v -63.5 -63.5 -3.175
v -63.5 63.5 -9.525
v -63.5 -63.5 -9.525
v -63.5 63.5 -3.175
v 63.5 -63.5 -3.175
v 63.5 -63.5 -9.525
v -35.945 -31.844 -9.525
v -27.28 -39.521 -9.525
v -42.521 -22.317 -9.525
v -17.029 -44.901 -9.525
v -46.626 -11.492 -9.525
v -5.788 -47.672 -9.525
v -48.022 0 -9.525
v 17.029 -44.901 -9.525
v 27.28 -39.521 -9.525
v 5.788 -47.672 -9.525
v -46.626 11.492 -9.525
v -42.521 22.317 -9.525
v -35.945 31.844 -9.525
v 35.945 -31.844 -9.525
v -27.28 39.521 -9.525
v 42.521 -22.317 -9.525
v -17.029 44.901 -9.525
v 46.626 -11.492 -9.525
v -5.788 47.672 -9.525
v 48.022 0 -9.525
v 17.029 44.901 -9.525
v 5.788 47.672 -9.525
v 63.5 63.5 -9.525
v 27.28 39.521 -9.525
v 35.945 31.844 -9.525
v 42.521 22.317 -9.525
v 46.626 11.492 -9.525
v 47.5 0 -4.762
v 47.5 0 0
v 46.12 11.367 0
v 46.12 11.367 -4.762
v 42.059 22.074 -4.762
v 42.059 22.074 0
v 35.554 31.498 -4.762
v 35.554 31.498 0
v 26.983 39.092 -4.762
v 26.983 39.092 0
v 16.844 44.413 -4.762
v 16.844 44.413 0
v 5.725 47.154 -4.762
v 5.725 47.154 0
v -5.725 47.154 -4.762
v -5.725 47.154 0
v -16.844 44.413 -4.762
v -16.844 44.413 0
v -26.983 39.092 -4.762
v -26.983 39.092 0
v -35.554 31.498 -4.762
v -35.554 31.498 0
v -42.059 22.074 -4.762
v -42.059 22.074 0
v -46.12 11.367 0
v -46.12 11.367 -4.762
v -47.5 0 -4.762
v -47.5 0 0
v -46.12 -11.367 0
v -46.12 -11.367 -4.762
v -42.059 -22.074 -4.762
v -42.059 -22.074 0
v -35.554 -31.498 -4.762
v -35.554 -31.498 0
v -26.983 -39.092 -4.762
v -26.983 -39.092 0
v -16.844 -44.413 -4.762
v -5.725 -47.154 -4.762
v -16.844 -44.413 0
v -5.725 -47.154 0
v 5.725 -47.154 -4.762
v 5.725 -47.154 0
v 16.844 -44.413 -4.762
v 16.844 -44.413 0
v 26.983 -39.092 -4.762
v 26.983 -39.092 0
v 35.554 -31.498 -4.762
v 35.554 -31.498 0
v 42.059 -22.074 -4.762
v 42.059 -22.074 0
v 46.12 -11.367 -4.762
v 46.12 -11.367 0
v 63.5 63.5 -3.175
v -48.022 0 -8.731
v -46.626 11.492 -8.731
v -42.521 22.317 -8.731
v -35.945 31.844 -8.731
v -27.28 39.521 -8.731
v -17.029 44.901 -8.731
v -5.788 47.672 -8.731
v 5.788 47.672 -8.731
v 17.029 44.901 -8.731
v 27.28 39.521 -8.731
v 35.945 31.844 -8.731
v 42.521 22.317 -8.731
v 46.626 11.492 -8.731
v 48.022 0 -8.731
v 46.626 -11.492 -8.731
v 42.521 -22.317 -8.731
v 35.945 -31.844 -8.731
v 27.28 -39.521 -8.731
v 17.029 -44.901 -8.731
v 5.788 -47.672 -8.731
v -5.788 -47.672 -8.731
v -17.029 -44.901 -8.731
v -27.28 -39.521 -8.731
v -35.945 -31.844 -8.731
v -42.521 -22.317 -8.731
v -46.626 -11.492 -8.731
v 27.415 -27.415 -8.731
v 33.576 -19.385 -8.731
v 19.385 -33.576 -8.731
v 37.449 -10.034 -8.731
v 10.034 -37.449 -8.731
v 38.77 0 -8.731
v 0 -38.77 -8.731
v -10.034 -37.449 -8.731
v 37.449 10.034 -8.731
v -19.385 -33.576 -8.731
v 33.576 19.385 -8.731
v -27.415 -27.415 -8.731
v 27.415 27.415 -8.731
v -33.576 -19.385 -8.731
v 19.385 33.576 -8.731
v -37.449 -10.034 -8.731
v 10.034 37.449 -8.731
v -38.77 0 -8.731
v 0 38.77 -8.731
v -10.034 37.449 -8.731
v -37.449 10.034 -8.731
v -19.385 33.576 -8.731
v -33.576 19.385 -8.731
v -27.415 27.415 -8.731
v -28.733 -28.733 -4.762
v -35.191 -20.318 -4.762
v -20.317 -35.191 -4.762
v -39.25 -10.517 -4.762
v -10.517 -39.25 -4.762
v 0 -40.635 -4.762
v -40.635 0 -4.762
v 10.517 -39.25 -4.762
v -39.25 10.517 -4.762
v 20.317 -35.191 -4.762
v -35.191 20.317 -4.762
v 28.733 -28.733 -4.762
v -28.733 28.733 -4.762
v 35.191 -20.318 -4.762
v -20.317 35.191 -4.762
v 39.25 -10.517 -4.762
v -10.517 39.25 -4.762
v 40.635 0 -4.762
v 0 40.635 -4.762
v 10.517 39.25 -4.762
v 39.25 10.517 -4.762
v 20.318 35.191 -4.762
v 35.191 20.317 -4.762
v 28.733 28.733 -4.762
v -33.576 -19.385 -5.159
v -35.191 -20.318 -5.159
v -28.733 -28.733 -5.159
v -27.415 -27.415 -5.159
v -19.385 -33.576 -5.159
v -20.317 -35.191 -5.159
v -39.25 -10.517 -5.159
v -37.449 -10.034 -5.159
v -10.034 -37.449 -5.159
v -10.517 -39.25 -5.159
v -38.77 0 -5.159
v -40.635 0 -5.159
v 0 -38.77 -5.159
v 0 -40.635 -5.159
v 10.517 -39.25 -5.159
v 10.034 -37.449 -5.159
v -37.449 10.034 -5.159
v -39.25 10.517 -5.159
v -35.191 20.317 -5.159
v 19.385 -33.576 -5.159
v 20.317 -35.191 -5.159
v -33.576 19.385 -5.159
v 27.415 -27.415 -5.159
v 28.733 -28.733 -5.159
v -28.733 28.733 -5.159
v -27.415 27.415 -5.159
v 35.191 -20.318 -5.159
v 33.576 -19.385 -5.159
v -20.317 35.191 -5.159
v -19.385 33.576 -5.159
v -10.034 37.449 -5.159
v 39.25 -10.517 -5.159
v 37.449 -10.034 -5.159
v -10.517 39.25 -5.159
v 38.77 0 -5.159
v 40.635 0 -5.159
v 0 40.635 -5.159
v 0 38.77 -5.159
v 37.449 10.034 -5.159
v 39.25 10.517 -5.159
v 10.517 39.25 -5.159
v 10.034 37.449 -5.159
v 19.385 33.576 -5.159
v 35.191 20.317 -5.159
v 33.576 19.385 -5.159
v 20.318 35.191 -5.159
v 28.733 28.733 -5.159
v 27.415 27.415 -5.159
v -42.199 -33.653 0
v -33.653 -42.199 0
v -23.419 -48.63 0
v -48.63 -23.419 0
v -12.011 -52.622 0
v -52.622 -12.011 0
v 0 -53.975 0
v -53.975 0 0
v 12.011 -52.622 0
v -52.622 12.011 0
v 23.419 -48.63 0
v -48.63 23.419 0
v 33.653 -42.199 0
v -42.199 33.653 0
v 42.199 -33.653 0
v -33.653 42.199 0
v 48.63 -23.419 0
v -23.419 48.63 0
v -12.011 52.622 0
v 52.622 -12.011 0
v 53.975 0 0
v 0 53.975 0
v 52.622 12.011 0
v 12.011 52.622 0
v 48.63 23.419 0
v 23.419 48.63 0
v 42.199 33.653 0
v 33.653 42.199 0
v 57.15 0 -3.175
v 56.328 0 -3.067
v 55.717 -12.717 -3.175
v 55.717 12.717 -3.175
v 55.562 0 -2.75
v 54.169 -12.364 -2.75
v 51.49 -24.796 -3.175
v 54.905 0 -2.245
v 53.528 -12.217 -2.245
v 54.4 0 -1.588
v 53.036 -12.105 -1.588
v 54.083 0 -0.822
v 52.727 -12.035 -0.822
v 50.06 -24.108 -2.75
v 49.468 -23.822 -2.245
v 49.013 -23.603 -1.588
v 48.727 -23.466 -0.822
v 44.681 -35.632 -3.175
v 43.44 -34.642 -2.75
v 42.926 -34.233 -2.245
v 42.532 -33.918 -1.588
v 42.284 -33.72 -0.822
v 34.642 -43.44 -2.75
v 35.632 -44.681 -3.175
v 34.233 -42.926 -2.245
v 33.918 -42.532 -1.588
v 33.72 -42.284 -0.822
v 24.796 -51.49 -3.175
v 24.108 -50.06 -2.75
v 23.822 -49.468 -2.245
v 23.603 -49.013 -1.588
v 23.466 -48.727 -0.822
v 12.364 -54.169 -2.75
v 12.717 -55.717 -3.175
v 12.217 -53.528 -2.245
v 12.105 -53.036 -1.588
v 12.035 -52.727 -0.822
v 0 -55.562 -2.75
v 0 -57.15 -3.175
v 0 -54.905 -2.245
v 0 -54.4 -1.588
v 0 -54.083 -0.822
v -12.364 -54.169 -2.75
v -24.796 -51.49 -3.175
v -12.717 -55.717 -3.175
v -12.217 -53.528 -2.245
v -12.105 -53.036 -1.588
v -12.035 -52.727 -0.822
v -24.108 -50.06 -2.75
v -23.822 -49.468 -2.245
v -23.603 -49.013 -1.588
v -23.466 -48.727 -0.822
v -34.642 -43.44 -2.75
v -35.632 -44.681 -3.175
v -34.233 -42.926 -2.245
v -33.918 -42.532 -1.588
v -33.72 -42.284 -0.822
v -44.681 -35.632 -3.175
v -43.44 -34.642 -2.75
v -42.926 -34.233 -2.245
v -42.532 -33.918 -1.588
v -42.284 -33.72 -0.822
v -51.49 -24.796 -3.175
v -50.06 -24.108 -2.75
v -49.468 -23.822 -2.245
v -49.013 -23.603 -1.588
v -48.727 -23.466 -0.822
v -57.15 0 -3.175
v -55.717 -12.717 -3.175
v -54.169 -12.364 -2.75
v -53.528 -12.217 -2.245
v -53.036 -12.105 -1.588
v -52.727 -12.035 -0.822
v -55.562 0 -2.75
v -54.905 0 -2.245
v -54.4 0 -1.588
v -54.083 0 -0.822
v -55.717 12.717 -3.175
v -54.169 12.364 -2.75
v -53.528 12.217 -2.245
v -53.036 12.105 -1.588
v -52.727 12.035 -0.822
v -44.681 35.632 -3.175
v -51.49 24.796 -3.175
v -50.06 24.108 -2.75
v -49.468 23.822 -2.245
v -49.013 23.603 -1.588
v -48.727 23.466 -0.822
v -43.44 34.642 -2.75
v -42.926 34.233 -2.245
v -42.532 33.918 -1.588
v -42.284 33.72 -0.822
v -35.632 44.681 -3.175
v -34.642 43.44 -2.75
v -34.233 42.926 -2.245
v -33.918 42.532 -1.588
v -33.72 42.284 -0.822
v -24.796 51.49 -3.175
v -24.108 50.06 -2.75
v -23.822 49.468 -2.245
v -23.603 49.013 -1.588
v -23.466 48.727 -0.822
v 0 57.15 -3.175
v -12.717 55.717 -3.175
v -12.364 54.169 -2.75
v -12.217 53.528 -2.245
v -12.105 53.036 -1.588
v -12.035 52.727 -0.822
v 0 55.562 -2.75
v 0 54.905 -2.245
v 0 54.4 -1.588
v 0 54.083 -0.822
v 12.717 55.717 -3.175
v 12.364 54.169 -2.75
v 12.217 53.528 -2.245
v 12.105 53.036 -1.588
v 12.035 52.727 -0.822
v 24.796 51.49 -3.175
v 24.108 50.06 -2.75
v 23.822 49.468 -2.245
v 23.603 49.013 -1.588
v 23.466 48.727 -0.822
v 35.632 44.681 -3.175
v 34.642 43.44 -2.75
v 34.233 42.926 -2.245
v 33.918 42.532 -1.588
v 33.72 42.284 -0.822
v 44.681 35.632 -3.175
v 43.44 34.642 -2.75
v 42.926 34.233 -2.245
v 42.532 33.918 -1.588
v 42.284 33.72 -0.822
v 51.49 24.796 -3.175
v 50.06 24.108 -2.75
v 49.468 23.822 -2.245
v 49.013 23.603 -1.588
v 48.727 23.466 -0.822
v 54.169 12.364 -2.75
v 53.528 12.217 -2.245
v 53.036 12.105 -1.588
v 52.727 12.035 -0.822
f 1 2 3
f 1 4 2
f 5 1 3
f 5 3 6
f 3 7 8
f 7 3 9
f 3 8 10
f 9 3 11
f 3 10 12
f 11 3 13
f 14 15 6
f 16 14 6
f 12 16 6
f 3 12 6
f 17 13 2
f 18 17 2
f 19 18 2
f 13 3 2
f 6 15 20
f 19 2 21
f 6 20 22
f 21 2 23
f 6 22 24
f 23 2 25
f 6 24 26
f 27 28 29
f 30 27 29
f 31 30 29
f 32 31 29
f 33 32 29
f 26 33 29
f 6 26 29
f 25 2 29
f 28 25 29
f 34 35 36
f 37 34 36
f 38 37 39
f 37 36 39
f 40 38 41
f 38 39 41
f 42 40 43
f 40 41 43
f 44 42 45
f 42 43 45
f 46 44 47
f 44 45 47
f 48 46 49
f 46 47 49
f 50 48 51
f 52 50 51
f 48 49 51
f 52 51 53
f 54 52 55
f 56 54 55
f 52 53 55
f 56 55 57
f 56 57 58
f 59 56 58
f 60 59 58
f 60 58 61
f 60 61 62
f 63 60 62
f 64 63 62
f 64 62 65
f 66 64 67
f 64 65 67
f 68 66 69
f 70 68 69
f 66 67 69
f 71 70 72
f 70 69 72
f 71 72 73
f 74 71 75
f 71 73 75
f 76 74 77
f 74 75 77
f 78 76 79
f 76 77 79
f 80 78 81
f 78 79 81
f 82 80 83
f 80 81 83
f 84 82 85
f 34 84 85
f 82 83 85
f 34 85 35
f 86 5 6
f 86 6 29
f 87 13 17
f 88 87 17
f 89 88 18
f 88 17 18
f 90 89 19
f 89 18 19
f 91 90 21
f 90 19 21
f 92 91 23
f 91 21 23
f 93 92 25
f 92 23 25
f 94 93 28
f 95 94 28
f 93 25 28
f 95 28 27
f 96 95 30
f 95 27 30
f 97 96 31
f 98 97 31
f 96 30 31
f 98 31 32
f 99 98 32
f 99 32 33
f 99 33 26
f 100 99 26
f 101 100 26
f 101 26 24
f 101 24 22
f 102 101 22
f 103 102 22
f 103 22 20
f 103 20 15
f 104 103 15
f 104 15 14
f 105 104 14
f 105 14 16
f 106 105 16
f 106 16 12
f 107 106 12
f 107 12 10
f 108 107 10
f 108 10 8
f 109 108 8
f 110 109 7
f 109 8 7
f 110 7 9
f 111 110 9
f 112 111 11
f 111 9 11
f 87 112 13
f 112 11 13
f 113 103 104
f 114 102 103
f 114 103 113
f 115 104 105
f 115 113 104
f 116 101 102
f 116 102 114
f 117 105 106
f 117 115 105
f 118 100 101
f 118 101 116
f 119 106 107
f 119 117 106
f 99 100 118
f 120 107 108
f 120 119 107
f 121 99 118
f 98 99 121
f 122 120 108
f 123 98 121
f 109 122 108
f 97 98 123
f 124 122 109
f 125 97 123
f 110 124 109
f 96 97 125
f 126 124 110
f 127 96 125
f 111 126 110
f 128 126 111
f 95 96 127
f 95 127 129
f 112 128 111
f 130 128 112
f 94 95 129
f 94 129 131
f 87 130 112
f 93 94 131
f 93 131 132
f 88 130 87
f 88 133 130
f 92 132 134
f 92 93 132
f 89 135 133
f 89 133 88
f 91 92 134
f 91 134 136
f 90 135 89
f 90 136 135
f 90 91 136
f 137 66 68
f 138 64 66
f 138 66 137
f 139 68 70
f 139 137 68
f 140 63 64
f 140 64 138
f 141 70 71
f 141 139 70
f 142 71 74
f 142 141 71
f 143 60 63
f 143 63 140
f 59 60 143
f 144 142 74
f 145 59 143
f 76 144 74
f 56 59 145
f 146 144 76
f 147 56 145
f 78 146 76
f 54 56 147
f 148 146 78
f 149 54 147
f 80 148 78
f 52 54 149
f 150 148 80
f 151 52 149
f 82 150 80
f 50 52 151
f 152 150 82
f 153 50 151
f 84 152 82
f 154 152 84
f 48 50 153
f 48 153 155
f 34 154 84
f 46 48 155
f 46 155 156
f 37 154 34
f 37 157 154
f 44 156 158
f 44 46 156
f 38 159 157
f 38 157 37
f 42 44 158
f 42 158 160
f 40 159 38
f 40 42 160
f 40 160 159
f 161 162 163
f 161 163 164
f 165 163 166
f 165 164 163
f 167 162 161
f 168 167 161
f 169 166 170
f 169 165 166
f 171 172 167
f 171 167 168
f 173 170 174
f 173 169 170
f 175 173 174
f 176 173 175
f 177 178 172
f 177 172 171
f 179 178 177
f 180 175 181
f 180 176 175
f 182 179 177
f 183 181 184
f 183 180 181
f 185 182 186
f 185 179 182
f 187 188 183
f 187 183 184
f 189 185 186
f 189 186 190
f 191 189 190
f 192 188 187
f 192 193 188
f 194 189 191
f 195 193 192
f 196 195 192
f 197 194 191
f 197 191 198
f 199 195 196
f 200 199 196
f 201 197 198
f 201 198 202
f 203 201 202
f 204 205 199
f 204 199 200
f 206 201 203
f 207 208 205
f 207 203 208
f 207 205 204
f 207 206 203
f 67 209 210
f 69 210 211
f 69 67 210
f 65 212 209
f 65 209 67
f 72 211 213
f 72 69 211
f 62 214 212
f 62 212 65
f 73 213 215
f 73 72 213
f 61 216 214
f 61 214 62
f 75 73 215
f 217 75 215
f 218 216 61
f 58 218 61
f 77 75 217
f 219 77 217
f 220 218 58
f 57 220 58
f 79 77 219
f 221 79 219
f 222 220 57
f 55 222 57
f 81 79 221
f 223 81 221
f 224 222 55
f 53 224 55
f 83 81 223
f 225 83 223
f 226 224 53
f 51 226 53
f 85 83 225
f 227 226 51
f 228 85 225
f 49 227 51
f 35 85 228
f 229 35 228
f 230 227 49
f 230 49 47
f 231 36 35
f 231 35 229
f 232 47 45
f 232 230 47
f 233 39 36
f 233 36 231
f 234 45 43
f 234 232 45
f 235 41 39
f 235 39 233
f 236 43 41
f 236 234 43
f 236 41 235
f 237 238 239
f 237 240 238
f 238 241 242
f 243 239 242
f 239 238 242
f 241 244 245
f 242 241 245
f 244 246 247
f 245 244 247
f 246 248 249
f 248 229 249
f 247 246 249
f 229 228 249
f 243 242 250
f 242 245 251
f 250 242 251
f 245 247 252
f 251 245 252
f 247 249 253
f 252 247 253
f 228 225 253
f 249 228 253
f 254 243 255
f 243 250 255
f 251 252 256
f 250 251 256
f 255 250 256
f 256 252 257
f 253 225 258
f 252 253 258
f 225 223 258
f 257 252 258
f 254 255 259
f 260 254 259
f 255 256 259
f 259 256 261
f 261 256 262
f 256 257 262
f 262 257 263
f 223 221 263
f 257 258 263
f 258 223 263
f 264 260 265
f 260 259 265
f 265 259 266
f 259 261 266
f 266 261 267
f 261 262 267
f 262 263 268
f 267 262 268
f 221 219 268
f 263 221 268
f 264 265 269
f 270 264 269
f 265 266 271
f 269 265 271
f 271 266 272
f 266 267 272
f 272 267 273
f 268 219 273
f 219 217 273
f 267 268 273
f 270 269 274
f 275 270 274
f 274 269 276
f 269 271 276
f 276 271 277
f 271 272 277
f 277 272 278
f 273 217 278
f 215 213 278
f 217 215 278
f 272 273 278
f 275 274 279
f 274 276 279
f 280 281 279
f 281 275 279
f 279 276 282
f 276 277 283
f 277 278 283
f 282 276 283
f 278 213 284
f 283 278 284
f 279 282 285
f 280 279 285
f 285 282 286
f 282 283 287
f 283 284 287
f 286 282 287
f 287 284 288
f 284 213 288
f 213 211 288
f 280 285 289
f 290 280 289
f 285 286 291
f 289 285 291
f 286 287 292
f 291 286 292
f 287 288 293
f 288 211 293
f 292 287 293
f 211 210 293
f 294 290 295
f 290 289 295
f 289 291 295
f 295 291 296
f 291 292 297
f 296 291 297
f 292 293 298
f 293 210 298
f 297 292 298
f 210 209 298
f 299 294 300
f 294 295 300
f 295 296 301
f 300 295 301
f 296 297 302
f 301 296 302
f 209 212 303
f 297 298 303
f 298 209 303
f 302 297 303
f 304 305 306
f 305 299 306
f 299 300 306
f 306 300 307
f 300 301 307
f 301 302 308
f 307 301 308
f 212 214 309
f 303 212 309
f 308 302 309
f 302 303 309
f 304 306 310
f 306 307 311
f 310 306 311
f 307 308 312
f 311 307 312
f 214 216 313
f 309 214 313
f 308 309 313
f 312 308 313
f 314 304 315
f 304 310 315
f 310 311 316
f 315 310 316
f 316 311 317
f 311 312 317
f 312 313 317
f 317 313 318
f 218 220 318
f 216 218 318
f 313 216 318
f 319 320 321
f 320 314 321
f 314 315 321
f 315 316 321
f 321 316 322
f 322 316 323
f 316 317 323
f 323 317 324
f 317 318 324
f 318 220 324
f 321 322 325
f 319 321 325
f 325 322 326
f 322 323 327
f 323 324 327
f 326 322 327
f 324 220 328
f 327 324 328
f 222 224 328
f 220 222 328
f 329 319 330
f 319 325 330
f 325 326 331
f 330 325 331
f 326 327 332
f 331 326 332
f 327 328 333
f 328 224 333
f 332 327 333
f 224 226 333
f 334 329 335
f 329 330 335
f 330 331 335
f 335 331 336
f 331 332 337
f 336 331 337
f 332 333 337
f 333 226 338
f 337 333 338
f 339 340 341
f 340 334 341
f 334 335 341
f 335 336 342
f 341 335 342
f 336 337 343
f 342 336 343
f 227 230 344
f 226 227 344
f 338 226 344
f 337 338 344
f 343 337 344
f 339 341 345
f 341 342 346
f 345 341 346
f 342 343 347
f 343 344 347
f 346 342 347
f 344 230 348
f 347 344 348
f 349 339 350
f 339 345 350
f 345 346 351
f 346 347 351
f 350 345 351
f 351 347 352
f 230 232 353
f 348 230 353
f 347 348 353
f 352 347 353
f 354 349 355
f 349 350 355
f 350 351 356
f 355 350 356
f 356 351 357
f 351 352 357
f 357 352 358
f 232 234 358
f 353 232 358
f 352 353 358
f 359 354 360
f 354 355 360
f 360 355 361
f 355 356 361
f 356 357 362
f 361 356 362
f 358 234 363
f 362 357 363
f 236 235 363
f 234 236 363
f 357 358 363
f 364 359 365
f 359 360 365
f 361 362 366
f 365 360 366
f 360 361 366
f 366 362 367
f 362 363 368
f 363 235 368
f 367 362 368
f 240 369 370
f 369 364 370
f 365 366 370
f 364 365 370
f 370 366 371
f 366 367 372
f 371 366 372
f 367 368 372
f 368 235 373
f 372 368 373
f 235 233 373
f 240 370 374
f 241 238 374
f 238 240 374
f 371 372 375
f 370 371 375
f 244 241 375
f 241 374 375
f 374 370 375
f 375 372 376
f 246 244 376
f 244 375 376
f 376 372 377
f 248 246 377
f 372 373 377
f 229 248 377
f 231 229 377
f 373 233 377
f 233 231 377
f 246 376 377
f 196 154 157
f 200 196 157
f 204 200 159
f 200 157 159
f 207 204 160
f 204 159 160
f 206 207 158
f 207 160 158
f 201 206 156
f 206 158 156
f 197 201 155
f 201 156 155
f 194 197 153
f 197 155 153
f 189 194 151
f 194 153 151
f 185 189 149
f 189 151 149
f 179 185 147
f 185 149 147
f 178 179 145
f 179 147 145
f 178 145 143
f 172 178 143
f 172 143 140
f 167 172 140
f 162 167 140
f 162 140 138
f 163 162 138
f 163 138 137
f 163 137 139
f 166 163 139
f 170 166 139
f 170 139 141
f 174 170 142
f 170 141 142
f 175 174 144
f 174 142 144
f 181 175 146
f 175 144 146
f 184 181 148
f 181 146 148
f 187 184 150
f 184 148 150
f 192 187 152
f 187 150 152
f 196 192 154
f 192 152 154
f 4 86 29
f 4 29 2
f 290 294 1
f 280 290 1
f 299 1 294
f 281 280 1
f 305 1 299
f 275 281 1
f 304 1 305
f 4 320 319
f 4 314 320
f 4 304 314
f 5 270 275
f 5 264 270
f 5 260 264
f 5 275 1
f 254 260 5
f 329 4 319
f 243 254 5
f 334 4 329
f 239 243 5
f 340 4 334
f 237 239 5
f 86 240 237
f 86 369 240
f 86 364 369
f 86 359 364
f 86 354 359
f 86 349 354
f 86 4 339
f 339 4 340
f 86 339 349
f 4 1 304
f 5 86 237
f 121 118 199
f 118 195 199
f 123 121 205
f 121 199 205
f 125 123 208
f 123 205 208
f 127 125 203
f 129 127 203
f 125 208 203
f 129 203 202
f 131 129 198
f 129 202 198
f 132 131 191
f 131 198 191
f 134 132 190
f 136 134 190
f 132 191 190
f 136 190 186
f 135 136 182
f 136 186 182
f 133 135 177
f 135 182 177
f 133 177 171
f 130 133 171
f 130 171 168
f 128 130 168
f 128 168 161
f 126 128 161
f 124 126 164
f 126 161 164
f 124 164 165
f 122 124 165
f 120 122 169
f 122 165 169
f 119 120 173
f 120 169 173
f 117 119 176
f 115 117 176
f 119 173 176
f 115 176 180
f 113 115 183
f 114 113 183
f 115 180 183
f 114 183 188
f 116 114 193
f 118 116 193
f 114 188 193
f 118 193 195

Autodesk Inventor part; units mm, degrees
ref_plane "YZ Plane" through (0, 0, 0) normal (1, 0, 0) x (0, 1, 0)
ref_plane "XZ Plane" through (0, 0, 0) normal (0, 1, 0) x (-1, 0, 0)
ref_plane "XY Plane" through (0, 0, 0) normal (0, 0, 1) x (1, 0, 0)
sketch "Sketch1" plane through (0, 0, 0) normal (0, 0, 1) x (1, 0, 0)
  line L0 (-63.5, -63.5) -> (63.5, -63.5)
  line L1 (63.5, -63.5) -> (63.5, 63.5)
  line L2 (63.5, 63.5) -> (-63.5, 63.5)
  line L3 (-63.5, 63.5) -> (-63.5, -63.5)
  line L4 (-63.5, -63.5) -> (63.5, 63.5) construction
  line L5 (63.5, -63.5) -> (-63.5, 63.5) construction
  circle A0 centre (0, 0) radius 47.5
  circle A1 centre (0, 0) radius 38.77
  circle A2 centre (0, 0) radius 40.635
  dimension "d0" = 127
  dimension "d1" = 127
  dimension "d2" = 95
  dimension "d3" = 77.54
  dimension "d4" = 81.27
extrude "Extrusion1" add sketch "Sketch1" against normal blind 9.525 contours L3 L2 L1 L0 | A0 | A2
extrude "Extrusion2" cut sketch "Sketch1" against normal blind 4.7625 contours A0
extrude "Extrusion3" cut sketch "Sketch1" against normal blind 5.1594 contours A2
sketch "Sketch2" plane through (0, 0, -9.525) normal (0, 0, -1) x (-1, 0, 0)
  circle A0 centre (0, 0) radius 38.77 projected
  circle A1 centre (0, 0) radius 38.1
  circle A2 centre (0, 0) radius 48.0219
  dimension "d11" = 76.2
  dimension "d12" = 96.0438
extrude "Extrusion4" cut sketch "Sketch2" against normal blind 0.7937 contours A2
sketch "Sketch3" plane through (0, 0, 0) normal (0, 0, 1) x (1, 0, 0)
  line L0 (-63.5, -63.5) -> (63.5, -63.5) projected
  line L1 (63.5, -63.5) -> (63.5, 63.5) projected
  line L2 (63.5, 63.5) -> (-63.5, 63.5) projected
  line L3 (-63.5, 63.5) -> (-63.5, -63.5) projected
  circle A0 centre (0, 0) radius 47.5 projected
  circle A1 centre (0, 0) radius 53.975
  dimension "d16" = 107.95
extrude "Extrusion5" cut sketch "Sketch3" against normal blind 3.175 contours L3 L2 L1 L0
fillet "Fillet1" radius 3.175 1 edges at (-53.975, 0, -3.175)
properties part number "Swerve Pre Baseplate"
